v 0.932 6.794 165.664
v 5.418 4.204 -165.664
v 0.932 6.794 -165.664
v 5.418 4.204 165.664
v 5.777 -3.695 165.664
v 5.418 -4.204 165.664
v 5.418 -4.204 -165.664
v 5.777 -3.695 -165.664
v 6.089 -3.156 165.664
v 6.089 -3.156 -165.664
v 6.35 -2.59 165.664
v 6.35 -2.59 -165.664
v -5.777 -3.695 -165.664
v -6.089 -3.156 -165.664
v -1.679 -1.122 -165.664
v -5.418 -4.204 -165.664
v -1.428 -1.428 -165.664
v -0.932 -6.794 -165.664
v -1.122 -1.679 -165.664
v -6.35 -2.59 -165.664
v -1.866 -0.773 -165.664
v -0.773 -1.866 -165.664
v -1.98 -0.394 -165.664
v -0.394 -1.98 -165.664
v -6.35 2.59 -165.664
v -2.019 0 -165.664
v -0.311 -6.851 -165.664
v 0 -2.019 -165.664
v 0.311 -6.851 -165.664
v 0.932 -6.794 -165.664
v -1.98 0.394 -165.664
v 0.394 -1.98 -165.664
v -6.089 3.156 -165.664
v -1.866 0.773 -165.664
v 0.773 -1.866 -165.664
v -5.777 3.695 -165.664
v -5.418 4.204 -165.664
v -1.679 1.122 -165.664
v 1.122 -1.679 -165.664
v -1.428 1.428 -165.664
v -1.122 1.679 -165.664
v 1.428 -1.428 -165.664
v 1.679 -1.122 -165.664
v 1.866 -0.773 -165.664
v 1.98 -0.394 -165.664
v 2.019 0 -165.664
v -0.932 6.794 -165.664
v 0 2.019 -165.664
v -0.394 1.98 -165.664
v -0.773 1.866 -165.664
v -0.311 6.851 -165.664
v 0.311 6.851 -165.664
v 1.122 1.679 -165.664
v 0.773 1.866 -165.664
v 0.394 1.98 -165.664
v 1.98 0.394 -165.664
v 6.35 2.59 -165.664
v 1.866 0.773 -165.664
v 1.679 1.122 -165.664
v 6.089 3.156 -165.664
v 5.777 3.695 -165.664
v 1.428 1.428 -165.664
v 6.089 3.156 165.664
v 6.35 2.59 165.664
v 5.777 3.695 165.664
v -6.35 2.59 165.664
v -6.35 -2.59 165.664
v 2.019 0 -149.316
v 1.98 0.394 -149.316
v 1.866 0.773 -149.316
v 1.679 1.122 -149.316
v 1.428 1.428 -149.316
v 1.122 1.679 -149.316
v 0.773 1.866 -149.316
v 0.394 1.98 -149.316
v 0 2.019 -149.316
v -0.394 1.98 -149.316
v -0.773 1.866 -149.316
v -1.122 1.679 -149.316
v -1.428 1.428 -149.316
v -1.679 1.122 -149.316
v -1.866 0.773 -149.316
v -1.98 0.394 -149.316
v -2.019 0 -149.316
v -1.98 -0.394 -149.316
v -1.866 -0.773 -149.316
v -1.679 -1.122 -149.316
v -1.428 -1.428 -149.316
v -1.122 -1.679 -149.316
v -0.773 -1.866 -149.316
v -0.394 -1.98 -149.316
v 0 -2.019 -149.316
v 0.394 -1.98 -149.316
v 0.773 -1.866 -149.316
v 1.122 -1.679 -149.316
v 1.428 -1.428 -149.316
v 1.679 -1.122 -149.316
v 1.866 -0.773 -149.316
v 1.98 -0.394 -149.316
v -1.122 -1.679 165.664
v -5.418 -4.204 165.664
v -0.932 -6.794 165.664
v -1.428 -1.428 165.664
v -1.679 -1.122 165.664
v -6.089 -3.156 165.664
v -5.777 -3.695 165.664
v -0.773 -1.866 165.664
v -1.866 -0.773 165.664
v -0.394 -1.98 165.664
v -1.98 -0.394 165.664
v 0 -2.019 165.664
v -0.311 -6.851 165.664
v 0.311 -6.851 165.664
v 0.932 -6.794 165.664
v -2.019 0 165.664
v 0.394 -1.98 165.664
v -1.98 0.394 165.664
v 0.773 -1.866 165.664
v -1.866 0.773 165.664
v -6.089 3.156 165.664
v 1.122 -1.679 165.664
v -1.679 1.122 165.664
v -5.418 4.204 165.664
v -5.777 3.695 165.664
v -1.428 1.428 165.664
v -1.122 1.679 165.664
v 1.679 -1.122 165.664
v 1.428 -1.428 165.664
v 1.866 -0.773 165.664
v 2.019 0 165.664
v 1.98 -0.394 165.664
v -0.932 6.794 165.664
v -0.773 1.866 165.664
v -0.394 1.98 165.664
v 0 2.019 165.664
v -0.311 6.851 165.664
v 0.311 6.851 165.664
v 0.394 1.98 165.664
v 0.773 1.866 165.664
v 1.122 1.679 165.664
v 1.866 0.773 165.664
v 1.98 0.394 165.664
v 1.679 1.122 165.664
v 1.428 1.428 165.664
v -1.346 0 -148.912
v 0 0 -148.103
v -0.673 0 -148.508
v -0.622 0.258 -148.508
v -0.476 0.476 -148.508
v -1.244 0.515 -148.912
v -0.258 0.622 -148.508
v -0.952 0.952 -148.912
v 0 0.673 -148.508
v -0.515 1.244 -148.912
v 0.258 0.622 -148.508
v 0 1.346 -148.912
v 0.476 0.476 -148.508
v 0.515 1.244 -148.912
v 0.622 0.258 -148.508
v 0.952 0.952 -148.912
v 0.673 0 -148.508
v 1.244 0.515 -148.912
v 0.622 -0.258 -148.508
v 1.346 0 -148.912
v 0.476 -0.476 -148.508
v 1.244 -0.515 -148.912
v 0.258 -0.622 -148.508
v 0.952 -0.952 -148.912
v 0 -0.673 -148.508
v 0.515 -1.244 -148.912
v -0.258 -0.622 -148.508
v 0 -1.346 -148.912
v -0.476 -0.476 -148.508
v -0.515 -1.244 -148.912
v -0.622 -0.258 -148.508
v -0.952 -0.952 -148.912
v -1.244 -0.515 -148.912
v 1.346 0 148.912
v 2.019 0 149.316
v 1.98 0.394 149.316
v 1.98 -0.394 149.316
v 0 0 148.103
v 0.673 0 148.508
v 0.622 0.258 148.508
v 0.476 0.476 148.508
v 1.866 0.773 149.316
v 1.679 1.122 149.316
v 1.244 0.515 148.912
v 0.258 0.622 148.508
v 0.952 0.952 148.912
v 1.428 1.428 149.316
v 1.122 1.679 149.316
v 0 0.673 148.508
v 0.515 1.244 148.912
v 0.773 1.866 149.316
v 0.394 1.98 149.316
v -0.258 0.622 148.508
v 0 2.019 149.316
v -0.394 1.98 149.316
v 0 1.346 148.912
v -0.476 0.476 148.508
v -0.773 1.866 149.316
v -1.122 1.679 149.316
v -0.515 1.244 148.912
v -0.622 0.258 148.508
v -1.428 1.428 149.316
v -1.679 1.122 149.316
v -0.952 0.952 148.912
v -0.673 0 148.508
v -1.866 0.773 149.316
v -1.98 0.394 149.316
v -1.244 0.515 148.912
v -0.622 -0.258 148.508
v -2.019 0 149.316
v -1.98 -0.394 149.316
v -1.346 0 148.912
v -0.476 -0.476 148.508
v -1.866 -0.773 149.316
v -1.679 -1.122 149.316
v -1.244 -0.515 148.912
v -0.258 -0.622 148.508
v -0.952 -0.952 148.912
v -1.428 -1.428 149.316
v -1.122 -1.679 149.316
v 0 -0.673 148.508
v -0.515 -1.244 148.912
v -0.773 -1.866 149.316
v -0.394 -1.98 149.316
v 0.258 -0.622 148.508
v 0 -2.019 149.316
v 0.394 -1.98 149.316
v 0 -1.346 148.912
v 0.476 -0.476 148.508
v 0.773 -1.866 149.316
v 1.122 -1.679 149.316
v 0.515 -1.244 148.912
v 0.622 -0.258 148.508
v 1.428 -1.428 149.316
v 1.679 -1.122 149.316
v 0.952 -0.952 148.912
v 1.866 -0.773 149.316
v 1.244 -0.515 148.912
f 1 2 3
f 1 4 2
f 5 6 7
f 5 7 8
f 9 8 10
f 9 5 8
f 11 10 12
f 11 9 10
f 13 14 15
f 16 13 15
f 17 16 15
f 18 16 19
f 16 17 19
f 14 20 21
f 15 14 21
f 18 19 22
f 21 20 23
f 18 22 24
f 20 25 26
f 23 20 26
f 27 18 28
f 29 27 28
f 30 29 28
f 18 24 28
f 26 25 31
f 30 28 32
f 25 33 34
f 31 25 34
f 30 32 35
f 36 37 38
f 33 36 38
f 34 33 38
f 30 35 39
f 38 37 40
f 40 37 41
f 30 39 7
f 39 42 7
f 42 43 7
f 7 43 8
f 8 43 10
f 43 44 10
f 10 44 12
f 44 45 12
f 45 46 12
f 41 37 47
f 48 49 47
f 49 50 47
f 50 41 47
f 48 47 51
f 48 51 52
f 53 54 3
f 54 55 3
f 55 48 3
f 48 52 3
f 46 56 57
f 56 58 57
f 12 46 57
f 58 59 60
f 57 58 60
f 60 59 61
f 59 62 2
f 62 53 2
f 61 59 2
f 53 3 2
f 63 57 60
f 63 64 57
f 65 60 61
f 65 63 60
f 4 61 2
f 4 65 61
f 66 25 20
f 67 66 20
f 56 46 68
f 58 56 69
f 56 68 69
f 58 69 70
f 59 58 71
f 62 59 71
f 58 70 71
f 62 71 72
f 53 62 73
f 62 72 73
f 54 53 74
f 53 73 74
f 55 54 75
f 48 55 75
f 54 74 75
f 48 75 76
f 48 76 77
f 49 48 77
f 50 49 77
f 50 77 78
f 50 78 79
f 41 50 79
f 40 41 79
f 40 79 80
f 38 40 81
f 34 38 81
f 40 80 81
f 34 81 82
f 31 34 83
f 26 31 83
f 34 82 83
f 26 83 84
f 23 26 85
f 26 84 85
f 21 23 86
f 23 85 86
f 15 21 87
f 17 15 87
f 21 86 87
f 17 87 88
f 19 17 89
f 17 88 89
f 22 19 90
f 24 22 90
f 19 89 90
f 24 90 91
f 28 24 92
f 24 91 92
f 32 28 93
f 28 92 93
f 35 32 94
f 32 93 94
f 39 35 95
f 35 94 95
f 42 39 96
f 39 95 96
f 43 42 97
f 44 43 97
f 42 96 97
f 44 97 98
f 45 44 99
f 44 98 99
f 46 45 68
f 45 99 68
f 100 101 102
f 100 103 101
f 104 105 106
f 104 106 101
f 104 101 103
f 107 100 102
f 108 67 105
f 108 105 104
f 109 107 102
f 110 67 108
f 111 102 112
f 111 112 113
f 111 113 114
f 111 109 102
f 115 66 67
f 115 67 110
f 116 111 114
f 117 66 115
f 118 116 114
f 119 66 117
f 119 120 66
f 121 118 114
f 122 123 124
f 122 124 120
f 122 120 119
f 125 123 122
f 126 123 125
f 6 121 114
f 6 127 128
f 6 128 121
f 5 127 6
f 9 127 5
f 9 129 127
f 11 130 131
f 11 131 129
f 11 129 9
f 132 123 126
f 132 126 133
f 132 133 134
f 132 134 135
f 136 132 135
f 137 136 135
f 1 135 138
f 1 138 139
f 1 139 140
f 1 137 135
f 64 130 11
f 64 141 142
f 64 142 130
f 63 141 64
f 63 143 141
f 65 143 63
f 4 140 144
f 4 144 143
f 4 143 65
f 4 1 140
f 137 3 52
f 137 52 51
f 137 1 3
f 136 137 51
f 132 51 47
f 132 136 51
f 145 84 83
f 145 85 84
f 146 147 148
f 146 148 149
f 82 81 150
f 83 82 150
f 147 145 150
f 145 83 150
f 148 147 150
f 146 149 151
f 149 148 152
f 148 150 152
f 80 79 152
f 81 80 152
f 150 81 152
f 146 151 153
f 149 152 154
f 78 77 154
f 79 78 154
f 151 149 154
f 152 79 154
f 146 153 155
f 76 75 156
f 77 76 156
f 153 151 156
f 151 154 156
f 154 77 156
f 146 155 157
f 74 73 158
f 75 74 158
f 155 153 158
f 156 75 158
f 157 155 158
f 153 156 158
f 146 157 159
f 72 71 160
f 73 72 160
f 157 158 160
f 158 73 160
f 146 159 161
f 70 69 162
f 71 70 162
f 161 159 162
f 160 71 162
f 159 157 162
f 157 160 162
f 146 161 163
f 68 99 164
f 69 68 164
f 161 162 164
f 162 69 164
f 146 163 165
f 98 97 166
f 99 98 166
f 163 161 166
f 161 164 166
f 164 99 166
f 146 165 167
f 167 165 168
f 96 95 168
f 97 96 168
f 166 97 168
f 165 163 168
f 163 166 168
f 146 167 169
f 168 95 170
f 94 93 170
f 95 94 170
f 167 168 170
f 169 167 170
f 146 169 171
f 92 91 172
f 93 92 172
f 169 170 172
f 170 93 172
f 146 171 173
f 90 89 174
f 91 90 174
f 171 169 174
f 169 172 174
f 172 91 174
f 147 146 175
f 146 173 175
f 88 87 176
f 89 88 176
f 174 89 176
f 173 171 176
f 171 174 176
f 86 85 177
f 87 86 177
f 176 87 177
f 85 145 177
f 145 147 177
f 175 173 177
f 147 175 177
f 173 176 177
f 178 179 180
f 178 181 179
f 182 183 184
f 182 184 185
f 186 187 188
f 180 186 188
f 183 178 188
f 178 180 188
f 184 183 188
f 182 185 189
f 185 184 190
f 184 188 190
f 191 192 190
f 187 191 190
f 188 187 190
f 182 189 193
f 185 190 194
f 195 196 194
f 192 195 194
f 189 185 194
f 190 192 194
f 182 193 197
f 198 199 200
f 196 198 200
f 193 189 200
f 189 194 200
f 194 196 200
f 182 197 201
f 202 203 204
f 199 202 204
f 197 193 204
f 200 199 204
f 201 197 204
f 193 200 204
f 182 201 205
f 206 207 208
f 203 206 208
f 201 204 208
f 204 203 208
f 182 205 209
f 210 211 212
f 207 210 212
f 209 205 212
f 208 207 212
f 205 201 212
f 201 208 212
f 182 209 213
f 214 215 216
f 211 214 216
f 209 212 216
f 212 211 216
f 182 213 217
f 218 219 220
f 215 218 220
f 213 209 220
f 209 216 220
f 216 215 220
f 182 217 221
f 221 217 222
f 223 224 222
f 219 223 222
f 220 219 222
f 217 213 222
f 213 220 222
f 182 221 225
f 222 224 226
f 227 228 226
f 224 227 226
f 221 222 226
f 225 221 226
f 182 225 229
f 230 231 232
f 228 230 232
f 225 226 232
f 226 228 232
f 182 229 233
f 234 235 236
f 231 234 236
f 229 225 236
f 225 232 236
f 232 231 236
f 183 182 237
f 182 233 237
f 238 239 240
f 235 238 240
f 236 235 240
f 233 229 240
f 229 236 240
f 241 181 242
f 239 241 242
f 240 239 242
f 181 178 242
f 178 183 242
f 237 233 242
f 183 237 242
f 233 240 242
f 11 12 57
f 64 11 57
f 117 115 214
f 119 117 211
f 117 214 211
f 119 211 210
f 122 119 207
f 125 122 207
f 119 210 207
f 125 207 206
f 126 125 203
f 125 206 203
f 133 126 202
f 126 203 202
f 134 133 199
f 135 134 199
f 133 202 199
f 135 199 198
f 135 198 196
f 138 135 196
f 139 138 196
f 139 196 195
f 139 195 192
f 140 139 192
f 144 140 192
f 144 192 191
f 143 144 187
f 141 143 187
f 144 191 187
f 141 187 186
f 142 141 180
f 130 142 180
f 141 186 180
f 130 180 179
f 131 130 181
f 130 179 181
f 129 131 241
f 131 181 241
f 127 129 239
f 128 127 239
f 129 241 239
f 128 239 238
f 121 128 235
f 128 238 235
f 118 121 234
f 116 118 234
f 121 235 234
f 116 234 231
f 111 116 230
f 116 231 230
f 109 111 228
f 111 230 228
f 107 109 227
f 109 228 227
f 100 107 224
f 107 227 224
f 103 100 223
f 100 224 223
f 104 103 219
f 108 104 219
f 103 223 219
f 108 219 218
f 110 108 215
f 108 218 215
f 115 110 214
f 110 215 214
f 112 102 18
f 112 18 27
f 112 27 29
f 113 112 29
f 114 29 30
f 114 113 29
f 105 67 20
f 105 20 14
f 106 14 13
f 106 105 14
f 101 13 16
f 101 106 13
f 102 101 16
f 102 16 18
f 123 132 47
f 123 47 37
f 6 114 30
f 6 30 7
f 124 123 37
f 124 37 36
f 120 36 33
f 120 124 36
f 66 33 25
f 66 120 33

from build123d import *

# Parameters (mm, degrees)
BOSS_EXTRUDE1_DEPTH                  = 165.66388
F_10_32_TAPPED_HOLE1_D               = 4.0386
F_10_32_TAPPED_HOLE1_DEPTH           = 16.34744
F_10_32_TAPPED_HOLE1_TIP             = 1.213317848
F_10_32_TAPPED_HOLE1_ON_FACE_2_D     = 4.0386
F_10_32_TAPPED_HOLE1_ON_FACE_2_DEPTH = 16.34744
F_10_32_TAPPED_HOLE1_ON_FACE_2_TIP   = 1.213317848


with BuildPart() as part:
    # Sketch1 → Boss-Extrude1 (new, symmetric)
    with BuildSketch(Plane.XY):
        with BuildLine():
            ThreePointArc((0.93173274, 6.79441227), (0, 6.858), (-0.93173274, 6.79441227))
            Line((-0.93173274, 6.79441227), (-5.41826726, 4.204110358))
            ThreePointArc((-5.41826726, 4.204110358), (-5.939202219, 3.429), (-6.35, 2.590301913))
            Line((-6.35, 2.590301913), (-6.35, -2.590301913))
            ThreePointArc((-6.35, -2.590301913), (-5.939202219, -3.429), (-5.41826726, -4.204110358))
            Line((-5.41826726, -4.204110358), (-0.93173274, -6.79441227))
            ThreePointArc((-0.93173274, -6.79441227), (0, -6.858), (0.93173274, -6.79441227))
            Line((0.93173274, -6.79441227), (5.41826726, -4.204110358))
            ThreePointArc((5.41826726, -4.204110358), (5.939202219, -3.429), (6.35, -2.590301913))
            Line((6.35, -2.590301913), (6.35, 2.590301913))
            ThreePointArc((6.35, 2.590301913), (5.939202219, 3.429), (5.41826726, 4.204110358))
            Line((5.41826726, 4.204110358), (0.93173274, 6.79441227))
        make_face()
    extrude(amount=BOSS_EXTRUDE1_DEPTH, both=True)

    # #10-32 Tapped Hole1
    with Locations(Plane.XY.offset(165.66388)):
        with Locations((0, 0)):
            Hole(F_10_32_TAPPED_HOLE1_D / 2, depth=F_10_32_TAPPED_HOLE1_DEPTH)
            with Locations((0, 0, -(F_10_32_TAPPED_HOLE1_DEPTH + F_10_32_TAPPED_HOLE1_TIP / 2))):  # 118° drill point
                Cone(0, F_10_32_TAPPED_HOLE1_D / 2, F_10_32_TAPPED_HOLE1_TIP, mode=Mode.SUBTRACT)

    # #10-32 Tapped Hole1 on face 2
    with Locations(Plane(origin=(0, 0, -165.66388), x_dir=(-1, 0, 0), z_dir=(0, 0, -1))):
        with Locations((0, 0)):
            Hole(F_10_32_TAPPED_HOLE1_ON_FACE_2_D / 2, depth=F_10_32_TAPPED_HOLE1_ON_FACE_2_DEPTH)
            with Locations((0, 0, -(F_10_32_TAPPED_HOLE1_ON_FACE_2_DEPTH + F_10_32_TAPPED_HOLE1_ON_FACE_2_TIP / 2))):  # 118° drill point
                Cone(0, F_10_32_TAPPED_HOLE1_ON_FACE_2_D / 2, F_10_32_TAPPED_HOLE1_ON_FACE_2_TIP, mode=Mode.SUBTRACT)


solid = part.part
